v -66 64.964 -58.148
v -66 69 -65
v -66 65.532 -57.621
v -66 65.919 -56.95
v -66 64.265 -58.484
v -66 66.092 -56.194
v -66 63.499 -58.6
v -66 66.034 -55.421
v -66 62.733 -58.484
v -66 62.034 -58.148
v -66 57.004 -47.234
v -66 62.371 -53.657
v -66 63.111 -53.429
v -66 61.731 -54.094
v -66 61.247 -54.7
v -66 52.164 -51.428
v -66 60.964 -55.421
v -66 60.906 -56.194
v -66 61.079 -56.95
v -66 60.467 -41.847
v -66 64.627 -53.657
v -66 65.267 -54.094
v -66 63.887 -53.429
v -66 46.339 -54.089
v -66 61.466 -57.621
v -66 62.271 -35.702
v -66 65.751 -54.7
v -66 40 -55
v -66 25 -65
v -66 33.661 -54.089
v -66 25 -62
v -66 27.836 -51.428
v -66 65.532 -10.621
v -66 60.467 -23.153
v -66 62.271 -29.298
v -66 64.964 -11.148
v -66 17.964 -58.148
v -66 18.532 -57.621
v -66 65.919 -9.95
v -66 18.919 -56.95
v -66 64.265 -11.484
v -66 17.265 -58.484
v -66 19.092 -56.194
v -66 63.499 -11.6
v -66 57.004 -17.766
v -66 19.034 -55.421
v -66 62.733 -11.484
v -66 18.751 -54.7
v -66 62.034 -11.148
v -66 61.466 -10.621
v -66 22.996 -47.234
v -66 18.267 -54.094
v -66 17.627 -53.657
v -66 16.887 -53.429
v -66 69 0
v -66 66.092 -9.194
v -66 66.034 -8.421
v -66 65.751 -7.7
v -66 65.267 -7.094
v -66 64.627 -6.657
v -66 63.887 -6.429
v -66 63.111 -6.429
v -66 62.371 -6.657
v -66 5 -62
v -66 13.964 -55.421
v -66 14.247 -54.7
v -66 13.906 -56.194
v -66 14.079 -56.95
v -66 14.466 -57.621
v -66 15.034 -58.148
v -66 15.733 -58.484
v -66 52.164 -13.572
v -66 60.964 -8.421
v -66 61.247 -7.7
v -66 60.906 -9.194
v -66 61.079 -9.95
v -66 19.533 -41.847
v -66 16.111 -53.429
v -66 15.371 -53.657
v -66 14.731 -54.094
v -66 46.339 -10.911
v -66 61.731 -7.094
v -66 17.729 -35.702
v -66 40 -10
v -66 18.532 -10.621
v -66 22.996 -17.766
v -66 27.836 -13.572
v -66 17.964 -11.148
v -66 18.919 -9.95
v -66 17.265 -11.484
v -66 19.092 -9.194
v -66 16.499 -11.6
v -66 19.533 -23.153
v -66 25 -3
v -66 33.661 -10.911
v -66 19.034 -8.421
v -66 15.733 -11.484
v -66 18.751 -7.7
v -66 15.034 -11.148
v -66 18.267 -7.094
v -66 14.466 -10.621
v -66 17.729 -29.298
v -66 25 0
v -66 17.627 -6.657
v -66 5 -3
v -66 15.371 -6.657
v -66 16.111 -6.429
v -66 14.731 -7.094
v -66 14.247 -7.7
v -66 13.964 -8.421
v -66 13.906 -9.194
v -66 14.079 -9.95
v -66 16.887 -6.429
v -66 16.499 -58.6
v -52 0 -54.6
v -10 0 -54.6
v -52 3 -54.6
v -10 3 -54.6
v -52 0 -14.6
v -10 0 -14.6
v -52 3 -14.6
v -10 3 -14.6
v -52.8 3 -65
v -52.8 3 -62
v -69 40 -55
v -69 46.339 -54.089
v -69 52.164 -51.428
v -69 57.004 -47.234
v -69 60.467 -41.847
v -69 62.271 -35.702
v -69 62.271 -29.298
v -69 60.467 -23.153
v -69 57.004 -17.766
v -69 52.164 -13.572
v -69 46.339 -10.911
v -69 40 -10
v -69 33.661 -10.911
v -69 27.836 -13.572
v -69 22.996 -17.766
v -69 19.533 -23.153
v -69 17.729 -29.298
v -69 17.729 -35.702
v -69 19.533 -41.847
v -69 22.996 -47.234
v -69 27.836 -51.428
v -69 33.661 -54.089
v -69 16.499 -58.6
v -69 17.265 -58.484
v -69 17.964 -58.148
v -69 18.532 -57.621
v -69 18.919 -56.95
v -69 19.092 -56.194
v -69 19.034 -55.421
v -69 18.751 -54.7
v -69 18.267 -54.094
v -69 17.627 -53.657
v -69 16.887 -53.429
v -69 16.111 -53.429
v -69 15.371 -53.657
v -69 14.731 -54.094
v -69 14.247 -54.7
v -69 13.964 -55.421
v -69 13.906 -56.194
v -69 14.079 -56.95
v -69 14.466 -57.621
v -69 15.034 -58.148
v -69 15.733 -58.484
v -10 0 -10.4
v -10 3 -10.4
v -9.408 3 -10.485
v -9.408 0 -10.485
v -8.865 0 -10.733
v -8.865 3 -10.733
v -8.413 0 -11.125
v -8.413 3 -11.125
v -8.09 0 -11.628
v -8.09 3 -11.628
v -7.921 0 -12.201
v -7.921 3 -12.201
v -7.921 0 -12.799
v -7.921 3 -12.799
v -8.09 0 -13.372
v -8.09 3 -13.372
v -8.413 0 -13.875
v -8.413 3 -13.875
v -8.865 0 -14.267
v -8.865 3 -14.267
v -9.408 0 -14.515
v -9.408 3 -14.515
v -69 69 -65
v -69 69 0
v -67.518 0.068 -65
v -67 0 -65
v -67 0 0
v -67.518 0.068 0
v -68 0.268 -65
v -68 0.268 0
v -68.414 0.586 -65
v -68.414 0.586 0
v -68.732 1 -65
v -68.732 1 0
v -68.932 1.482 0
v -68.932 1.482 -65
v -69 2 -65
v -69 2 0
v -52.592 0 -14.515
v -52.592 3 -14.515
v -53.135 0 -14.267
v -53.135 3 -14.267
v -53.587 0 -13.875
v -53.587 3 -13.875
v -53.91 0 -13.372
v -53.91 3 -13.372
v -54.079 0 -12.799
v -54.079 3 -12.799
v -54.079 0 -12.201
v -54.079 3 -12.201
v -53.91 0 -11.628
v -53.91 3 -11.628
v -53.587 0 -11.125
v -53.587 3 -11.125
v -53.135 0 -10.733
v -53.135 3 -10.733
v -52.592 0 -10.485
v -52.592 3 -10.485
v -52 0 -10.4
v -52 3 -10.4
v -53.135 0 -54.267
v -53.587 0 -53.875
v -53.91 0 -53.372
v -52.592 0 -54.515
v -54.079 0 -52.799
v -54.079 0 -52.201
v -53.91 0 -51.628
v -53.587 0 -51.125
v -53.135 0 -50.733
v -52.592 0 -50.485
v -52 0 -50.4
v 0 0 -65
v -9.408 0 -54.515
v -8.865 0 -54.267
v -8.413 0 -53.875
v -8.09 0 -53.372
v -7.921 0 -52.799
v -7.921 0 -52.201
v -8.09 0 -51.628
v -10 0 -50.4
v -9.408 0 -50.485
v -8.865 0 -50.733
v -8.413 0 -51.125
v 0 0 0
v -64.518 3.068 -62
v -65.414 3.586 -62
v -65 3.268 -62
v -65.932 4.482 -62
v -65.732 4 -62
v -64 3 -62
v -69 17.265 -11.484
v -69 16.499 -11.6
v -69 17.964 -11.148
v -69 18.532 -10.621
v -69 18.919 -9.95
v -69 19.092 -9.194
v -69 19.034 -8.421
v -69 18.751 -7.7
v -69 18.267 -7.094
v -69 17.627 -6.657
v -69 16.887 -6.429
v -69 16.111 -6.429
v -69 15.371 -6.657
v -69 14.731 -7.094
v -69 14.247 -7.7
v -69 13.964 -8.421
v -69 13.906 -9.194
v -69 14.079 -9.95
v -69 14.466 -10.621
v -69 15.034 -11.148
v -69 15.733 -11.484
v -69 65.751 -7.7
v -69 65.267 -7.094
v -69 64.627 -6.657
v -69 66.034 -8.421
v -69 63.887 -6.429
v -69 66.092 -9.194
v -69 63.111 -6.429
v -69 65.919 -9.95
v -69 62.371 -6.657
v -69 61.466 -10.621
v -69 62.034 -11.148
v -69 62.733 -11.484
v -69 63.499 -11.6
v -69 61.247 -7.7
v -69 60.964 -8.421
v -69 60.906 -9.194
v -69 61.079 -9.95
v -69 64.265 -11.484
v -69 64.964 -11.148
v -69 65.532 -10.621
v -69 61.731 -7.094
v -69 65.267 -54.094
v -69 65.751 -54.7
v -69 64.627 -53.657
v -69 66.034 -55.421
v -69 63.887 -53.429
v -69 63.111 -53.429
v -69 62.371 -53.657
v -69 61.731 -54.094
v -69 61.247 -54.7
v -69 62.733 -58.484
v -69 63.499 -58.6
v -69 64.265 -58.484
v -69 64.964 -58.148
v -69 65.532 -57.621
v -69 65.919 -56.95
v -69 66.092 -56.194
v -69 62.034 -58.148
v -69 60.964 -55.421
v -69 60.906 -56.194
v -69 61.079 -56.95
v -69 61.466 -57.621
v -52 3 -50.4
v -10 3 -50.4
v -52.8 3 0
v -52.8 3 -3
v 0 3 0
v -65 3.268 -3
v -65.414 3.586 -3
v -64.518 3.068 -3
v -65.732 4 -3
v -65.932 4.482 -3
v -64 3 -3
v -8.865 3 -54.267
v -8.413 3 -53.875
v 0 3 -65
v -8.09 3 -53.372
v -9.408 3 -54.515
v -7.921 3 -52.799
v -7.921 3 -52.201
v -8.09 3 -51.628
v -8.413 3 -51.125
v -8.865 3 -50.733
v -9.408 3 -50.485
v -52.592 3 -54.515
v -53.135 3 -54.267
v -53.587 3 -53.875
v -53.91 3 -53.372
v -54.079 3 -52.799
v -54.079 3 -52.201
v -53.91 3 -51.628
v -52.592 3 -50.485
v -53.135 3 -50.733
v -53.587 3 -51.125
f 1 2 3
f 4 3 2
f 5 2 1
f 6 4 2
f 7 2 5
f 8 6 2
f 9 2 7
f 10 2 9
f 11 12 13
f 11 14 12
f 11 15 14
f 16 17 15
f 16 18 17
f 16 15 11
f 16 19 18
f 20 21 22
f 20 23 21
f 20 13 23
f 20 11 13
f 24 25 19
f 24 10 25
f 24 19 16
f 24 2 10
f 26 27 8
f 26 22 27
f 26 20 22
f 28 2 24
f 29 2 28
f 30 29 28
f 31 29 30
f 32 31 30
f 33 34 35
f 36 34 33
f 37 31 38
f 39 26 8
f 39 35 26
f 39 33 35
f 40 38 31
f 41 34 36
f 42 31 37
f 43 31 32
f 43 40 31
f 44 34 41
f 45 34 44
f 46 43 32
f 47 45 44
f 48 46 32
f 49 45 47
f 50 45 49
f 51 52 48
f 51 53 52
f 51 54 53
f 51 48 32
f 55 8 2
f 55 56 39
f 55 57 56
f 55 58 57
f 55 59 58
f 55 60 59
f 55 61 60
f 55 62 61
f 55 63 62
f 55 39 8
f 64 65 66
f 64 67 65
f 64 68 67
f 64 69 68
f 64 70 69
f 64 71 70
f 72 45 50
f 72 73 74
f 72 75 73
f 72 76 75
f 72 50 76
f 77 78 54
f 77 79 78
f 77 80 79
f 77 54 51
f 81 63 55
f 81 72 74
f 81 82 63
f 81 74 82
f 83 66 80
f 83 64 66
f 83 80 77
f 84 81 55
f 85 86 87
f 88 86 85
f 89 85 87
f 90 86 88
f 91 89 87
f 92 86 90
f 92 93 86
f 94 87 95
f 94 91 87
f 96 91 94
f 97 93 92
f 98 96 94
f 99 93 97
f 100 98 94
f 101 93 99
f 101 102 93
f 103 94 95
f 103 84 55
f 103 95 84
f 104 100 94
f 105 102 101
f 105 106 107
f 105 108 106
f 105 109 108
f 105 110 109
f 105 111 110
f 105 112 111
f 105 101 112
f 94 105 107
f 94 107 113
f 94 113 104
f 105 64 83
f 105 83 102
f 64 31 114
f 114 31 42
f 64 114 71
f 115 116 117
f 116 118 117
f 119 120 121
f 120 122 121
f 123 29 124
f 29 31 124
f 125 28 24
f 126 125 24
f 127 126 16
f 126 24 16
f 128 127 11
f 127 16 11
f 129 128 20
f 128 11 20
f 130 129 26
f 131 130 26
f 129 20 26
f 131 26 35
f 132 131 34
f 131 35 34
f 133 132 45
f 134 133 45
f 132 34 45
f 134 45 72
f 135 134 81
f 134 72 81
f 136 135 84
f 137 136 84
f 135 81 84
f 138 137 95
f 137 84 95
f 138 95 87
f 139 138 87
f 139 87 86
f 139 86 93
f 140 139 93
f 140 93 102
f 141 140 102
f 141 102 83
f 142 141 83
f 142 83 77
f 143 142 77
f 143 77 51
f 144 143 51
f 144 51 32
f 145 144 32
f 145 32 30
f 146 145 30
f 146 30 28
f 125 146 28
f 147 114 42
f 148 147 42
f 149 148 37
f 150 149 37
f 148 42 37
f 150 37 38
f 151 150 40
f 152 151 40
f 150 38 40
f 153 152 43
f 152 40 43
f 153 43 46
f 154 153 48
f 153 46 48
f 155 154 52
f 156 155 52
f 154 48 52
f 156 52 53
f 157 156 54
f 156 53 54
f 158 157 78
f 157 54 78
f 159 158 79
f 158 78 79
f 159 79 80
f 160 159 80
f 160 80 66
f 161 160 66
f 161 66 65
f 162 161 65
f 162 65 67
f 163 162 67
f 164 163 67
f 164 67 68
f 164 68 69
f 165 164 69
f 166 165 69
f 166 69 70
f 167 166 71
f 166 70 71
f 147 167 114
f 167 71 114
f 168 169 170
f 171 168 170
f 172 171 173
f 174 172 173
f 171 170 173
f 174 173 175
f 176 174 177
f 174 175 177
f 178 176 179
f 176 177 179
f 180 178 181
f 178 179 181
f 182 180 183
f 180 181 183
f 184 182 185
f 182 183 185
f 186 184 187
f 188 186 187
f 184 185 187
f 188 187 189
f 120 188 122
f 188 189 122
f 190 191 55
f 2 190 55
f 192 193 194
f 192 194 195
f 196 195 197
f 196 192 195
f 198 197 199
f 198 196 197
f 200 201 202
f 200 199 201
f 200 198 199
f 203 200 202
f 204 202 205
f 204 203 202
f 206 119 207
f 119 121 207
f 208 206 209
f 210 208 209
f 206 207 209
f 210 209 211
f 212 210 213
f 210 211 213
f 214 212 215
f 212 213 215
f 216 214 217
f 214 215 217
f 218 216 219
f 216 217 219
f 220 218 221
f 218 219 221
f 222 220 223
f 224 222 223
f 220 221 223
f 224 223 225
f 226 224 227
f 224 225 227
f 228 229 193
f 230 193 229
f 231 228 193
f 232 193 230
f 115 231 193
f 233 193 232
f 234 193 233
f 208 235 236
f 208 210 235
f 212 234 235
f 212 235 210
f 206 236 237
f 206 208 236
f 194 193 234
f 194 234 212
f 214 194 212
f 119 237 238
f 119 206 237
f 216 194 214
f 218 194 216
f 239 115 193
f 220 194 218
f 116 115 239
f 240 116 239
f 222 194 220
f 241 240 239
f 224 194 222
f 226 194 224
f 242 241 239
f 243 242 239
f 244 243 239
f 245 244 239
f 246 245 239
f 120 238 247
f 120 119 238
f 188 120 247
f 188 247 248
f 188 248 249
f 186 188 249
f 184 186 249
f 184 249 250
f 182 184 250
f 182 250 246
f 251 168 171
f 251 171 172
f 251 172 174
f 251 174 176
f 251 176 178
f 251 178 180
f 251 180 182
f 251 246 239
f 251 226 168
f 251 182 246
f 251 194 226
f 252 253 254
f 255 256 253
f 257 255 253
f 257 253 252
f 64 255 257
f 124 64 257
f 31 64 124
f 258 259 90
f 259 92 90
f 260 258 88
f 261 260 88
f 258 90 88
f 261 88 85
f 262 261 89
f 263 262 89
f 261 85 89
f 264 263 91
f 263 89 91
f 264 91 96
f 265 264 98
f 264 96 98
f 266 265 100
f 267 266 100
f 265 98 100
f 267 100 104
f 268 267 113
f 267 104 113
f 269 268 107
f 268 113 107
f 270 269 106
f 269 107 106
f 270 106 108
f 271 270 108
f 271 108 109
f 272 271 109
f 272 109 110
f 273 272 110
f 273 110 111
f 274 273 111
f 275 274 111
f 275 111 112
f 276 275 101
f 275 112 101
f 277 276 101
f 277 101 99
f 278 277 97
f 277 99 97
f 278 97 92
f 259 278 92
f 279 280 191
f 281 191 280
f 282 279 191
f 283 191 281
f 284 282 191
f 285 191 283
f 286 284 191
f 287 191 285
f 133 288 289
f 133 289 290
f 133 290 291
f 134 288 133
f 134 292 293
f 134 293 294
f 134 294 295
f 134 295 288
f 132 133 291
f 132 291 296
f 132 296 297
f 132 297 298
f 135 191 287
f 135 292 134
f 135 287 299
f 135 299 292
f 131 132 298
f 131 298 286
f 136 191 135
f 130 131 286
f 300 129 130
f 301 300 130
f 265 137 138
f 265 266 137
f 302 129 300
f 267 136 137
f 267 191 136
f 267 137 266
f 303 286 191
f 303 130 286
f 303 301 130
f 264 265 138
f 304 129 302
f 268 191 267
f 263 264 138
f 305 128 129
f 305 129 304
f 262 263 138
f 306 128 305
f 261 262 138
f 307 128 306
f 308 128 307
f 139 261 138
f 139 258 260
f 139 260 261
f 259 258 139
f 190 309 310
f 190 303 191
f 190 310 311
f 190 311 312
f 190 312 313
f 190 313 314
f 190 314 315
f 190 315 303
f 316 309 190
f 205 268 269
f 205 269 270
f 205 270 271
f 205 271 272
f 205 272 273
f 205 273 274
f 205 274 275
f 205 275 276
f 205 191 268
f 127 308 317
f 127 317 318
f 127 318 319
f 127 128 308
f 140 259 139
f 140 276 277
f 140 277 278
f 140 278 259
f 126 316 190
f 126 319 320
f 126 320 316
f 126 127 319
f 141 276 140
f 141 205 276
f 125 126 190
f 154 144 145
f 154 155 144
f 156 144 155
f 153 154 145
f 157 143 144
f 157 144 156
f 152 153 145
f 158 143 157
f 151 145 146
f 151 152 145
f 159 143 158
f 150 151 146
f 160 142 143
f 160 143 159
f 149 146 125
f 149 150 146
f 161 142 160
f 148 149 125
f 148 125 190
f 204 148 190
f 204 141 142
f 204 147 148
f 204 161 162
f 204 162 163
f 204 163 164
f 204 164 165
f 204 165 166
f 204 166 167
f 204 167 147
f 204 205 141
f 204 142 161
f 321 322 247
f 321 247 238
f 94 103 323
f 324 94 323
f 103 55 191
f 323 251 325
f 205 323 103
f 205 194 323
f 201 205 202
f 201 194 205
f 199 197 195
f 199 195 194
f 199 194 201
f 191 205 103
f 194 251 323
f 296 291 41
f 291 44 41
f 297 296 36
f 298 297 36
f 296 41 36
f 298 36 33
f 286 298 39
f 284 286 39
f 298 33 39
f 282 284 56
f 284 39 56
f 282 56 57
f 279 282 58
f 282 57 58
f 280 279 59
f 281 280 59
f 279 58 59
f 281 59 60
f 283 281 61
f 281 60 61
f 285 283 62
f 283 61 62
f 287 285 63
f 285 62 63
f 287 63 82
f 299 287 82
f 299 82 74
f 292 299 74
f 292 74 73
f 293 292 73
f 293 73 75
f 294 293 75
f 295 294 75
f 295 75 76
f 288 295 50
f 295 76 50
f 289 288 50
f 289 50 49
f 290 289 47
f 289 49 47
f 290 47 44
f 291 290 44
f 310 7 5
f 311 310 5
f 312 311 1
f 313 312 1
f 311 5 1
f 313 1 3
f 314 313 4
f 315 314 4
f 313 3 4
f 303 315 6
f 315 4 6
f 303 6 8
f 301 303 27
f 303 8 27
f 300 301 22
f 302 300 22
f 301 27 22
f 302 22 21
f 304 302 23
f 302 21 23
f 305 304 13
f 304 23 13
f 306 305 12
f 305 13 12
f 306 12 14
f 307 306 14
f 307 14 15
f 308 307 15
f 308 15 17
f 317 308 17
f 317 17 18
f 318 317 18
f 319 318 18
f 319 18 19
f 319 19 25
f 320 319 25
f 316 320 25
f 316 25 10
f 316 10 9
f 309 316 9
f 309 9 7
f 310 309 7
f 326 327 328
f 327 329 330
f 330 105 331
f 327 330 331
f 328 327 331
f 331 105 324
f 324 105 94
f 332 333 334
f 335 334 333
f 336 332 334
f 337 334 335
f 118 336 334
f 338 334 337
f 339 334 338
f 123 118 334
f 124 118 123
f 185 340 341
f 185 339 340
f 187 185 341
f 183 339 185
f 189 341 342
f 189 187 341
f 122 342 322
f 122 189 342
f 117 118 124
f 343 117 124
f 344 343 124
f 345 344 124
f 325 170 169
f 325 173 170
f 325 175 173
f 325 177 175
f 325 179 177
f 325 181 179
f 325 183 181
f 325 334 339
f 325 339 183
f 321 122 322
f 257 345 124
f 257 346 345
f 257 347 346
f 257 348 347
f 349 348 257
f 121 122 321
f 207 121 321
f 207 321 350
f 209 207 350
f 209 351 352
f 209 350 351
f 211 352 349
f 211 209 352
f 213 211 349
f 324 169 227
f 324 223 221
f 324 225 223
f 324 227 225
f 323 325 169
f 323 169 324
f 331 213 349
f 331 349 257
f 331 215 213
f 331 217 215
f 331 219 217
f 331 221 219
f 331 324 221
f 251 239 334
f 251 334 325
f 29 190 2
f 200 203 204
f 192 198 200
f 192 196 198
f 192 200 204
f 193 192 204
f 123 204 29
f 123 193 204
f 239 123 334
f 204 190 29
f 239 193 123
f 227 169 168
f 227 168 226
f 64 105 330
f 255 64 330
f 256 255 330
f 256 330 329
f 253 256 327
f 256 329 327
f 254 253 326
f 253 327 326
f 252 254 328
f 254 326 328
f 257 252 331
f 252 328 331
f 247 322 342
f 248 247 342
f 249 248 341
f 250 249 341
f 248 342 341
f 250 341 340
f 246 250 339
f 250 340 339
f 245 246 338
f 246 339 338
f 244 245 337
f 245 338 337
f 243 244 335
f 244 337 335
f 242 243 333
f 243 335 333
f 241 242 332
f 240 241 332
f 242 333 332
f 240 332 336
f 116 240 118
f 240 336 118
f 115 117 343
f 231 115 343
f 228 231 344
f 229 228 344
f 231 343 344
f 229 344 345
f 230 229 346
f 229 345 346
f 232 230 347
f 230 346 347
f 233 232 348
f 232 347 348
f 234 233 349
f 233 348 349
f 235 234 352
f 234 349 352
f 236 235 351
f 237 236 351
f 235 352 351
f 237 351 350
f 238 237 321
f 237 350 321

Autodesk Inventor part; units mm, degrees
ref_plane "YZ Plane" through (0, 0, 0) normal (1, 0, 0) x (0, 1, 0)
ref_plane "XZ Plane" through (0, 0, 0) normal (0, 1, 0) x (-1, 0, 0)
ref_plane "XY Plane" through (0, 0, 0) normal (0, 0, 1) x (1, 0, 0)
sketch "Sketch1" plane through (0, 0, 0) normal (0, 1, 0) x (-1, 0, 0)
  line L0 (0, 0) -> (69, 0)
  line L1 (69, 0) -> (69, -65)
  line L2 (69, -65) -> (0, -65)
  line L3 (0, -65) -> (0, 0)
  dimension "d0" = 69
  dimension "d1" = 65
extrude "Extrusion1" add sketch "Sketch1" along normal blind 3
sketch "Sketch2" plane through (0, 3, 0) normal (0, 1, 0) x (1, 0, 0)
  line L0 (0, 65) -> (-69, 65) projected
  line L1 (-69, 65) -> (-66, 65)
  line L2 (-66, 65) -> (-66, 0)
  line L3 (-66, 0) -> (-69, 0)
  line L4 (-69, 0) -> (-69, 65)
  point P0 (0, 0)
  dimension "d4" = 3
  dimension "d5" = 65
extrude "Extrusion2" add sketch "Sketch2" along normal blind 66
fillet "Fillet1" radius 2 2 edges at (-66, 3, -32.5) (-69, 0, -32.5)
sketch "Sketch3" plane through (0, 0, 0) normal (0, 0, 1) x (1, 0, 0)
  line L0 (-67, 0) -> (0, 0) projected
  line L1 (-66, 0) -> (-51, 0) construction
  line L2 (-66, 5) -> (-66, 69) projected
  line L3 (-66, 5) -> (-66, 0)
  line L4 (-66, 5) -> (-61, 5) construction
  line L5 (-66, 0) -> (-51, 0)
  line L6 (-66, 0) -> (-66, 25)
  line L7 (-66, 25) -> (-51, 0)
  dimension "d12" = 5
  dimension "d13" = 90
  dimension "d14" = 15
  dimension "d15" = 90
  dimension "d16" = 25
extrude "Extrusion3" add sketch "Sketch3" against normal blind 3
pattern_linear "Rectangular Pattern1" count 2 spacing 62 along (0, 0, -1) of "Extrusion3"
sketch "Sketch4" plane through (-66, 69, 0) normal (1, 0, 0) x (0, 0, -1)
  circle A0 centre (32.5, -29) radius 22.5
  line L0 (0, 0) -> (65, 0) projected
  line L1 (0, -44) -> (0, 0) projected
  point P0 (0, -69)
  dimension "d22" = 45
  dimension "d23" = 29
  dimension "d24" = 32.5
extrude "Extrusion4" cut sketch "Sketch4" against normal blind 3
sketch "Sketch5" plane through (-66, 69, 0) normal (1, 0, 0) x (0, 0, -1)
  circle A0 centre (9, -5.501) radius 2.6
  line L0 (0, 0) -> (65, 0) projected
  line L1 (0, -44) -> (0, 0) projected
  circle A1 centre (56, -5.501) radius 2.6
  circle A2 centre (9, -52.501) radius 2.6
  circle A3 centre (56, -52.501) radius 2.6
  point P0 (0, -69)
  dimension "d27" = 5.2
  dimension "d28" = 5.501
  dimension "d29" = 9
  dimension "d32" = 47
  dimension "d35" = 47
extrude "Extrusion5" cut sketch "Sketch5" against normal blind 3
sketch "Sketch6" plane through (0, 3, 0) normal (0, 1, 0) x (1, 0, 0)
  line L0 (-52.8, 0) -> (0, 0) projected
  line L1 (0, 0) -> (0, 65) projected
  arc A0 (-10, 10.4) -> (-10, 14.6) centre (-10, 12.5) ccw
  arc A1 (-52, 14.6) -> (-52, 10.4) centre (-52, 12.5) ccw
  line L2 (-10, 14.6) -> (-52, 14.6)
  line L3 (-69, 65) -> (-69, 0) projected
  line L4 (-10, 12.5) -> (-7.9, 12.5) construction
  line L5 (-10, 10.4) -> (-52, 10.4)
  dimension "d47" = 4.2
  dimension "d48" = 4.2
  dimension "d49" = 12.5
  dimension "d50" = 12.5
  dimension "d52" = 42
  dimension "d54" = 17
extrude "Extrusion6" cut sketch "Sketch6" against normal blind 3
pattern_linear "Rectangular Pattern2" count 2 spacing 40 along (0, 0, -1) of "Extrusion6"
properties part number "NEMA23_StepperonlineMount"
